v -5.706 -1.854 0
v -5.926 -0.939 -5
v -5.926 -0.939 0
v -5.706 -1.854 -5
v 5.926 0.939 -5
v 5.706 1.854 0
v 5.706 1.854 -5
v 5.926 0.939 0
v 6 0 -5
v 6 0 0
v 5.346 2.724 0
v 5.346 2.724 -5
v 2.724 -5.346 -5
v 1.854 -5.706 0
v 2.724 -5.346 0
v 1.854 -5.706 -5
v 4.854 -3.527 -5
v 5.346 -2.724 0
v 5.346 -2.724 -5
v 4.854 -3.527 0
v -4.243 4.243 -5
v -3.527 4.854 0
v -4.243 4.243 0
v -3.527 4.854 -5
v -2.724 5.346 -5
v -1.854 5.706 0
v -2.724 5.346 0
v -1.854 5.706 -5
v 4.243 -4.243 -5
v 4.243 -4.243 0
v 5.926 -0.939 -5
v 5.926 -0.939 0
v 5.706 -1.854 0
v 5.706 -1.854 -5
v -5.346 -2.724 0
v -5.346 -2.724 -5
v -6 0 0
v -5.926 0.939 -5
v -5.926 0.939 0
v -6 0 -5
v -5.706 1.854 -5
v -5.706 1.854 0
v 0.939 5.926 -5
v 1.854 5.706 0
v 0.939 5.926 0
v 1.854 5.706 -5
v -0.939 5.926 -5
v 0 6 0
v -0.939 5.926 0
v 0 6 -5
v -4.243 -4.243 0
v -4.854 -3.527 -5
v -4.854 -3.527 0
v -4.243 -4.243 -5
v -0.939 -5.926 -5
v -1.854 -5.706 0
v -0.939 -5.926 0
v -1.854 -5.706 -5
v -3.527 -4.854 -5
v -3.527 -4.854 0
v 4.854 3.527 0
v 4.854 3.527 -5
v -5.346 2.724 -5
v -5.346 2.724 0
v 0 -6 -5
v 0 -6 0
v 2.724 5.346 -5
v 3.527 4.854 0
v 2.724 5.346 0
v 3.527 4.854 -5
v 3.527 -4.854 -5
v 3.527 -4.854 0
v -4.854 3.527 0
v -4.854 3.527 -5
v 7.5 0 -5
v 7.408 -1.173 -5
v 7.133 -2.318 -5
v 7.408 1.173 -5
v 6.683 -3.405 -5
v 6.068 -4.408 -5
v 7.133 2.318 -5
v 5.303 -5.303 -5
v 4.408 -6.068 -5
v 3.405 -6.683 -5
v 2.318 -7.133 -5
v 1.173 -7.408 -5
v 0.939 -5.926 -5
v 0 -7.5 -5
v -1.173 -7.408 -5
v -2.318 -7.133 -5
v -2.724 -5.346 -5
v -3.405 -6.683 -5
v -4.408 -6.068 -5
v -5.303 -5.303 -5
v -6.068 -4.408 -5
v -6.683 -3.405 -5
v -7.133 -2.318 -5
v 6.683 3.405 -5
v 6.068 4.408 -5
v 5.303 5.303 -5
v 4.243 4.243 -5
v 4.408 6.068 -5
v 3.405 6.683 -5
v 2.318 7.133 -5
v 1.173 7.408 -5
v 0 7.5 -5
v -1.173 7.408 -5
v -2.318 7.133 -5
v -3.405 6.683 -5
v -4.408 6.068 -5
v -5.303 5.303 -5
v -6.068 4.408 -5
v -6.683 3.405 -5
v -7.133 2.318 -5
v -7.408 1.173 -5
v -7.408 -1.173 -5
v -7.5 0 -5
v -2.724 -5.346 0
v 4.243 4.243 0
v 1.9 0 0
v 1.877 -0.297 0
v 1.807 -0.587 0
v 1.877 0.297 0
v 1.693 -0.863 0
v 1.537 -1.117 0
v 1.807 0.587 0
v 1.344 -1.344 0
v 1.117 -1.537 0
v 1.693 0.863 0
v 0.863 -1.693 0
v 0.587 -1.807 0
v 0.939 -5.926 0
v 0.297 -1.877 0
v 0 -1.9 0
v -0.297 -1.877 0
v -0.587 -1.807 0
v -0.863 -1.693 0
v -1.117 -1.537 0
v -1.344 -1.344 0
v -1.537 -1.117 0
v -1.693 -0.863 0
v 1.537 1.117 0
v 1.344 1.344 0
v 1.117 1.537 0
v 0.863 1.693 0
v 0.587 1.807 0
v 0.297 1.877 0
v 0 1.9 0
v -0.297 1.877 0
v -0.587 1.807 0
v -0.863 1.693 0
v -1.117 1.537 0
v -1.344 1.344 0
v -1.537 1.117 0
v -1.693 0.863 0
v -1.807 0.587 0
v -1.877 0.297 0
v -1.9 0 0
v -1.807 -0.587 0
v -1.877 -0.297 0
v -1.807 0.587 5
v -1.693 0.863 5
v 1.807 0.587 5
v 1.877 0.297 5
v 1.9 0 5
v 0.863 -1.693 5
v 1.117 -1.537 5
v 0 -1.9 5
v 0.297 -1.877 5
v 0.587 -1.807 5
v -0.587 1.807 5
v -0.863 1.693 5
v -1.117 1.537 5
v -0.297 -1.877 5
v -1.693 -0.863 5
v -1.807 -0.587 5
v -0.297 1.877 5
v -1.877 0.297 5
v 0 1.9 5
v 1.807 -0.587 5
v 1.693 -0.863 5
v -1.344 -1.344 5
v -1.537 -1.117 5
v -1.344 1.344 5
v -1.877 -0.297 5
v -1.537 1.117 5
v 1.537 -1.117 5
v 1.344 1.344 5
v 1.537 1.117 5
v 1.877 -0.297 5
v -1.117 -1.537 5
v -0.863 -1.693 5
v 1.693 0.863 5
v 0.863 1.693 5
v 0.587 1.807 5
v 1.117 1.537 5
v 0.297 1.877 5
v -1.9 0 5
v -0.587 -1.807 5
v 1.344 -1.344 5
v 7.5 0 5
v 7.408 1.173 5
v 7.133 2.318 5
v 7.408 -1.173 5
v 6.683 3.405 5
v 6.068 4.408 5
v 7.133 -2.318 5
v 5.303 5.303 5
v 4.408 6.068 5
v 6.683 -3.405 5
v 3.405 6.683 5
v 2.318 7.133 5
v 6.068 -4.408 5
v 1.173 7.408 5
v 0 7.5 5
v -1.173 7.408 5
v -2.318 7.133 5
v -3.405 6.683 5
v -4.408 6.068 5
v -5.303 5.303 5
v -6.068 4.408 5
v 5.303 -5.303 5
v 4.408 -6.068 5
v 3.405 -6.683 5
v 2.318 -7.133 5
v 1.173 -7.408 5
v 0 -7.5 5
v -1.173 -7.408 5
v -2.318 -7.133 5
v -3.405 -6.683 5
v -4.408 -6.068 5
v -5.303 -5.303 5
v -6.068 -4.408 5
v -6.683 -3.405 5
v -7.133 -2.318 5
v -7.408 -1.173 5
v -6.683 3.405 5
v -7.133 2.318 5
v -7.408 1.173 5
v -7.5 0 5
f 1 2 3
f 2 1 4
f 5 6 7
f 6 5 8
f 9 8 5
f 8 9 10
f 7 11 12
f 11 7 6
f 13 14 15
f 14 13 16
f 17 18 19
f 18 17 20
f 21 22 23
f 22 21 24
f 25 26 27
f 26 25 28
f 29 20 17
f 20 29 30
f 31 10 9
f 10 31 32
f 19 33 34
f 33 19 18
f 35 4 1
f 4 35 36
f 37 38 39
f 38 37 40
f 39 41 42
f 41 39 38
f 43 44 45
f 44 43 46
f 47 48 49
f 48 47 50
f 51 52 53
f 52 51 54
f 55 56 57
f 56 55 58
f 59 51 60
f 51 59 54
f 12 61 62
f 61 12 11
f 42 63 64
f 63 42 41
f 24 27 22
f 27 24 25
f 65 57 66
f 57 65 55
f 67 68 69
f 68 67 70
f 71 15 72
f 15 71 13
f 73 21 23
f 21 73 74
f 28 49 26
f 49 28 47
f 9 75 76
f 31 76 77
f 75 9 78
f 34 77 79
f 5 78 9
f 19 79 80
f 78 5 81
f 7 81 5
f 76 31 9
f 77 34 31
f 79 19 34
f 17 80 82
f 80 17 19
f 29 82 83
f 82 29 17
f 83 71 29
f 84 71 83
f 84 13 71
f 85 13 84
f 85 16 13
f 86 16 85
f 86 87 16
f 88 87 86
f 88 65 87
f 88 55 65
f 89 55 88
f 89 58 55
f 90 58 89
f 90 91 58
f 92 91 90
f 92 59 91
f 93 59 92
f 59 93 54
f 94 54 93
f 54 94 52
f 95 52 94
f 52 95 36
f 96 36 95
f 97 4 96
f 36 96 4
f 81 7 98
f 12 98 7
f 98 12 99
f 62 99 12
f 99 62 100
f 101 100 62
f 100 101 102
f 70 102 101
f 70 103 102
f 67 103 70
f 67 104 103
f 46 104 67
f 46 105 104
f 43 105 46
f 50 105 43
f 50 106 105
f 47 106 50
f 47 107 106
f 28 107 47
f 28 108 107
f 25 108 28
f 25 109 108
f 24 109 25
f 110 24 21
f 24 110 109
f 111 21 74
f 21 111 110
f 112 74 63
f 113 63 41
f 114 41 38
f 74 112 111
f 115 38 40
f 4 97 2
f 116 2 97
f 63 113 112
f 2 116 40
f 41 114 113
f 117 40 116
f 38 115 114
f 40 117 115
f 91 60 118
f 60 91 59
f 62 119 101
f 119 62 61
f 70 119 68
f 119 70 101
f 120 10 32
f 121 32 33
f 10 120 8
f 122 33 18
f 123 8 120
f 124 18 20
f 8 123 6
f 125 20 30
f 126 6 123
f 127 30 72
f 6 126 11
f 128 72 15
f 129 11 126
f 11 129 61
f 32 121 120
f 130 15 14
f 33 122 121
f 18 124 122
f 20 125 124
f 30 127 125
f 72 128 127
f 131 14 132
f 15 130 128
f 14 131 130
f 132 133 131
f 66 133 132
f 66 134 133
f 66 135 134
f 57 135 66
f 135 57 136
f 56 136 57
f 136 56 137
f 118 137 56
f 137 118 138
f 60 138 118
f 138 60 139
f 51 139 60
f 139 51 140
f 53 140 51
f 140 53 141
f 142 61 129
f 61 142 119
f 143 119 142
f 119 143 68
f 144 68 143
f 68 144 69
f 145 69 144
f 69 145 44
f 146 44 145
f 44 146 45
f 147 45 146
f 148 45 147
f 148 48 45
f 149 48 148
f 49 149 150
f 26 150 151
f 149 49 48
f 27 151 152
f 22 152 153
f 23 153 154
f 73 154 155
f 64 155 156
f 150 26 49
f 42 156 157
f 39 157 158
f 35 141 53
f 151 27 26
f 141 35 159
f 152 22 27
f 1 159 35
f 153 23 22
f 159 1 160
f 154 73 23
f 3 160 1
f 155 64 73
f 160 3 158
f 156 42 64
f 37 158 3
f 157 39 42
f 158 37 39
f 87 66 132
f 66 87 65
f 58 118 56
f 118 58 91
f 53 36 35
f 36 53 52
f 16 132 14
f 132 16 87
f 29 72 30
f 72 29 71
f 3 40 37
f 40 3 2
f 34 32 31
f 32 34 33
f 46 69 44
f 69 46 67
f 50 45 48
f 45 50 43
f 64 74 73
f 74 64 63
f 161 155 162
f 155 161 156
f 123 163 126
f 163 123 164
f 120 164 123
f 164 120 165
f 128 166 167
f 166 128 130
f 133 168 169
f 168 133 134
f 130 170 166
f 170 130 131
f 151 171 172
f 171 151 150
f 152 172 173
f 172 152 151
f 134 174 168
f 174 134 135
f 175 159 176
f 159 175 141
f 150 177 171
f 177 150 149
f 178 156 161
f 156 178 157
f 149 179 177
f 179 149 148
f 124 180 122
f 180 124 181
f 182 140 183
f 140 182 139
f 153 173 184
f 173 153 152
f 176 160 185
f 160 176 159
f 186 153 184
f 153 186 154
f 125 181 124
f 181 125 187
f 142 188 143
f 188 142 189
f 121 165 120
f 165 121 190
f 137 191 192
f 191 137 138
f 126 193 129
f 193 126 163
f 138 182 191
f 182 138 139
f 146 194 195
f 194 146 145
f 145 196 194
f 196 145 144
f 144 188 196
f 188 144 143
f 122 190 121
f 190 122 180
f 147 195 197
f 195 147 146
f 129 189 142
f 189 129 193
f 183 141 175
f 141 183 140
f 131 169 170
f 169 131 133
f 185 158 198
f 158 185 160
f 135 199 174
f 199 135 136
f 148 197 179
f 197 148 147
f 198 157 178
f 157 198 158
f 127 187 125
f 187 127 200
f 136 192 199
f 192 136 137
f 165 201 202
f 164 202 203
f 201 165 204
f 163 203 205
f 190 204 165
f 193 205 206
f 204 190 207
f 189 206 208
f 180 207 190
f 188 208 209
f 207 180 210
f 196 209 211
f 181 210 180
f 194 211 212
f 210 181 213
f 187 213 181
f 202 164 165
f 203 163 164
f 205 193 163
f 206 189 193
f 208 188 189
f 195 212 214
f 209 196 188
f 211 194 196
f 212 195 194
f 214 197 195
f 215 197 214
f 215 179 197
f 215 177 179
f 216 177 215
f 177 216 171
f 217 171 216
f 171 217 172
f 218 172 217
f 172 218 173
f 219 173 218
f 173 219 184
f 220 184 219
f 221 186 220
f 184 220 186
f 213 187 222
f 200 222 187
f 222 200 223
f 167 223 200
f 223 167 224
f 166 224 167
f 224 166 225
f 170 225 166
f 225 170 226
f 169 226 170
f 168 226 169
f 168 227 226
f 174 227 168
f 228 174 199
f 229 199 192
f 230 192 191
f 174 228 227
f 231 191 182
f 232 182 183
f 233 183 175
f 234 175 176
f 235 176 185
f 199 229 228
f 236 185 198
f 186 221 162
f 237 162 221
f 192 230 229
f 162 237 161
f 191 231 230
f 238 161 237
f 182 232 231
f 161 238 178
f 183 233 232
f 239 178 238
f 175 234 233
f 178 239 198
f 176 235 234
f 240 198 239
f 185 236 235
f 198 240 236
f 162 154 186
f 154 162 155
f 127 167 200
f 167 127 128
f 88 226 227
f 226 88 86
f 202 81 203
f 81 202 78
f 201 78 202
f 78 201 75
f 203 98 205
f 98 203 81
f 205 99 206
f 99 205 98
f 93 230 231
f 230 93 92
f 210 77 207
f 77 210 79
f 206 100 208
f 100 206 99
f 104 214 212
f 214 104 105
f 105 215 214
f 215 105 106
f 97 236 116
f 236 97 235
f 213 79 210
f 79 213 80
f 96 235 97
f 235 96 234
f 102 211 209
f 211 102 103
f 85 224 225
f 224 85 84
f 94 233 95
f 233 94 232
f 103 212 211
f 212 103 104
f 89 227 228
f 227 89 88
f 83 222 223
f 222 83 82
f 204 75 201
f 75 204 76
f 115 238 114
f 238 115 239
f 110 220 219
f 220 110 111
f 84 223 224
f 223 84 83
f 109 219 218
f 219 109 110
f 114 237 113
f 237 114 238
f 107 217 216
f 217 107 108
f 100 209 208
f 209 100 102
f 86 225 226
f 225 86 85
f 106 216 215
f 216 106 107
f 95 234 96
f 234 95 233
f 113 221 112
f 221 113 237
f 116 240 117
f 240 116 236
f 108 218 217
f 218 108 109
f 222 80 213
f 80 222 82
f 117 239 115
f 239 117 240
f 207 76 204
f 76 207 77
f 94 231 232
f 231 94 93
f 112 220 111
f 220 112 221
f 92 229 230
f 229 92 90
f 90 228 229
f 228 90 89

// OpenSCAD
$fn = 40;

difference(){
    union(){
       cylinder(h=10,d=15, center=true);
     }
     union(){
        translate([0,0,-5]) cylinder(h=5,d=12);
        translate([0,0,0]) cylinder(h=5,d=3.8);
     }
}
